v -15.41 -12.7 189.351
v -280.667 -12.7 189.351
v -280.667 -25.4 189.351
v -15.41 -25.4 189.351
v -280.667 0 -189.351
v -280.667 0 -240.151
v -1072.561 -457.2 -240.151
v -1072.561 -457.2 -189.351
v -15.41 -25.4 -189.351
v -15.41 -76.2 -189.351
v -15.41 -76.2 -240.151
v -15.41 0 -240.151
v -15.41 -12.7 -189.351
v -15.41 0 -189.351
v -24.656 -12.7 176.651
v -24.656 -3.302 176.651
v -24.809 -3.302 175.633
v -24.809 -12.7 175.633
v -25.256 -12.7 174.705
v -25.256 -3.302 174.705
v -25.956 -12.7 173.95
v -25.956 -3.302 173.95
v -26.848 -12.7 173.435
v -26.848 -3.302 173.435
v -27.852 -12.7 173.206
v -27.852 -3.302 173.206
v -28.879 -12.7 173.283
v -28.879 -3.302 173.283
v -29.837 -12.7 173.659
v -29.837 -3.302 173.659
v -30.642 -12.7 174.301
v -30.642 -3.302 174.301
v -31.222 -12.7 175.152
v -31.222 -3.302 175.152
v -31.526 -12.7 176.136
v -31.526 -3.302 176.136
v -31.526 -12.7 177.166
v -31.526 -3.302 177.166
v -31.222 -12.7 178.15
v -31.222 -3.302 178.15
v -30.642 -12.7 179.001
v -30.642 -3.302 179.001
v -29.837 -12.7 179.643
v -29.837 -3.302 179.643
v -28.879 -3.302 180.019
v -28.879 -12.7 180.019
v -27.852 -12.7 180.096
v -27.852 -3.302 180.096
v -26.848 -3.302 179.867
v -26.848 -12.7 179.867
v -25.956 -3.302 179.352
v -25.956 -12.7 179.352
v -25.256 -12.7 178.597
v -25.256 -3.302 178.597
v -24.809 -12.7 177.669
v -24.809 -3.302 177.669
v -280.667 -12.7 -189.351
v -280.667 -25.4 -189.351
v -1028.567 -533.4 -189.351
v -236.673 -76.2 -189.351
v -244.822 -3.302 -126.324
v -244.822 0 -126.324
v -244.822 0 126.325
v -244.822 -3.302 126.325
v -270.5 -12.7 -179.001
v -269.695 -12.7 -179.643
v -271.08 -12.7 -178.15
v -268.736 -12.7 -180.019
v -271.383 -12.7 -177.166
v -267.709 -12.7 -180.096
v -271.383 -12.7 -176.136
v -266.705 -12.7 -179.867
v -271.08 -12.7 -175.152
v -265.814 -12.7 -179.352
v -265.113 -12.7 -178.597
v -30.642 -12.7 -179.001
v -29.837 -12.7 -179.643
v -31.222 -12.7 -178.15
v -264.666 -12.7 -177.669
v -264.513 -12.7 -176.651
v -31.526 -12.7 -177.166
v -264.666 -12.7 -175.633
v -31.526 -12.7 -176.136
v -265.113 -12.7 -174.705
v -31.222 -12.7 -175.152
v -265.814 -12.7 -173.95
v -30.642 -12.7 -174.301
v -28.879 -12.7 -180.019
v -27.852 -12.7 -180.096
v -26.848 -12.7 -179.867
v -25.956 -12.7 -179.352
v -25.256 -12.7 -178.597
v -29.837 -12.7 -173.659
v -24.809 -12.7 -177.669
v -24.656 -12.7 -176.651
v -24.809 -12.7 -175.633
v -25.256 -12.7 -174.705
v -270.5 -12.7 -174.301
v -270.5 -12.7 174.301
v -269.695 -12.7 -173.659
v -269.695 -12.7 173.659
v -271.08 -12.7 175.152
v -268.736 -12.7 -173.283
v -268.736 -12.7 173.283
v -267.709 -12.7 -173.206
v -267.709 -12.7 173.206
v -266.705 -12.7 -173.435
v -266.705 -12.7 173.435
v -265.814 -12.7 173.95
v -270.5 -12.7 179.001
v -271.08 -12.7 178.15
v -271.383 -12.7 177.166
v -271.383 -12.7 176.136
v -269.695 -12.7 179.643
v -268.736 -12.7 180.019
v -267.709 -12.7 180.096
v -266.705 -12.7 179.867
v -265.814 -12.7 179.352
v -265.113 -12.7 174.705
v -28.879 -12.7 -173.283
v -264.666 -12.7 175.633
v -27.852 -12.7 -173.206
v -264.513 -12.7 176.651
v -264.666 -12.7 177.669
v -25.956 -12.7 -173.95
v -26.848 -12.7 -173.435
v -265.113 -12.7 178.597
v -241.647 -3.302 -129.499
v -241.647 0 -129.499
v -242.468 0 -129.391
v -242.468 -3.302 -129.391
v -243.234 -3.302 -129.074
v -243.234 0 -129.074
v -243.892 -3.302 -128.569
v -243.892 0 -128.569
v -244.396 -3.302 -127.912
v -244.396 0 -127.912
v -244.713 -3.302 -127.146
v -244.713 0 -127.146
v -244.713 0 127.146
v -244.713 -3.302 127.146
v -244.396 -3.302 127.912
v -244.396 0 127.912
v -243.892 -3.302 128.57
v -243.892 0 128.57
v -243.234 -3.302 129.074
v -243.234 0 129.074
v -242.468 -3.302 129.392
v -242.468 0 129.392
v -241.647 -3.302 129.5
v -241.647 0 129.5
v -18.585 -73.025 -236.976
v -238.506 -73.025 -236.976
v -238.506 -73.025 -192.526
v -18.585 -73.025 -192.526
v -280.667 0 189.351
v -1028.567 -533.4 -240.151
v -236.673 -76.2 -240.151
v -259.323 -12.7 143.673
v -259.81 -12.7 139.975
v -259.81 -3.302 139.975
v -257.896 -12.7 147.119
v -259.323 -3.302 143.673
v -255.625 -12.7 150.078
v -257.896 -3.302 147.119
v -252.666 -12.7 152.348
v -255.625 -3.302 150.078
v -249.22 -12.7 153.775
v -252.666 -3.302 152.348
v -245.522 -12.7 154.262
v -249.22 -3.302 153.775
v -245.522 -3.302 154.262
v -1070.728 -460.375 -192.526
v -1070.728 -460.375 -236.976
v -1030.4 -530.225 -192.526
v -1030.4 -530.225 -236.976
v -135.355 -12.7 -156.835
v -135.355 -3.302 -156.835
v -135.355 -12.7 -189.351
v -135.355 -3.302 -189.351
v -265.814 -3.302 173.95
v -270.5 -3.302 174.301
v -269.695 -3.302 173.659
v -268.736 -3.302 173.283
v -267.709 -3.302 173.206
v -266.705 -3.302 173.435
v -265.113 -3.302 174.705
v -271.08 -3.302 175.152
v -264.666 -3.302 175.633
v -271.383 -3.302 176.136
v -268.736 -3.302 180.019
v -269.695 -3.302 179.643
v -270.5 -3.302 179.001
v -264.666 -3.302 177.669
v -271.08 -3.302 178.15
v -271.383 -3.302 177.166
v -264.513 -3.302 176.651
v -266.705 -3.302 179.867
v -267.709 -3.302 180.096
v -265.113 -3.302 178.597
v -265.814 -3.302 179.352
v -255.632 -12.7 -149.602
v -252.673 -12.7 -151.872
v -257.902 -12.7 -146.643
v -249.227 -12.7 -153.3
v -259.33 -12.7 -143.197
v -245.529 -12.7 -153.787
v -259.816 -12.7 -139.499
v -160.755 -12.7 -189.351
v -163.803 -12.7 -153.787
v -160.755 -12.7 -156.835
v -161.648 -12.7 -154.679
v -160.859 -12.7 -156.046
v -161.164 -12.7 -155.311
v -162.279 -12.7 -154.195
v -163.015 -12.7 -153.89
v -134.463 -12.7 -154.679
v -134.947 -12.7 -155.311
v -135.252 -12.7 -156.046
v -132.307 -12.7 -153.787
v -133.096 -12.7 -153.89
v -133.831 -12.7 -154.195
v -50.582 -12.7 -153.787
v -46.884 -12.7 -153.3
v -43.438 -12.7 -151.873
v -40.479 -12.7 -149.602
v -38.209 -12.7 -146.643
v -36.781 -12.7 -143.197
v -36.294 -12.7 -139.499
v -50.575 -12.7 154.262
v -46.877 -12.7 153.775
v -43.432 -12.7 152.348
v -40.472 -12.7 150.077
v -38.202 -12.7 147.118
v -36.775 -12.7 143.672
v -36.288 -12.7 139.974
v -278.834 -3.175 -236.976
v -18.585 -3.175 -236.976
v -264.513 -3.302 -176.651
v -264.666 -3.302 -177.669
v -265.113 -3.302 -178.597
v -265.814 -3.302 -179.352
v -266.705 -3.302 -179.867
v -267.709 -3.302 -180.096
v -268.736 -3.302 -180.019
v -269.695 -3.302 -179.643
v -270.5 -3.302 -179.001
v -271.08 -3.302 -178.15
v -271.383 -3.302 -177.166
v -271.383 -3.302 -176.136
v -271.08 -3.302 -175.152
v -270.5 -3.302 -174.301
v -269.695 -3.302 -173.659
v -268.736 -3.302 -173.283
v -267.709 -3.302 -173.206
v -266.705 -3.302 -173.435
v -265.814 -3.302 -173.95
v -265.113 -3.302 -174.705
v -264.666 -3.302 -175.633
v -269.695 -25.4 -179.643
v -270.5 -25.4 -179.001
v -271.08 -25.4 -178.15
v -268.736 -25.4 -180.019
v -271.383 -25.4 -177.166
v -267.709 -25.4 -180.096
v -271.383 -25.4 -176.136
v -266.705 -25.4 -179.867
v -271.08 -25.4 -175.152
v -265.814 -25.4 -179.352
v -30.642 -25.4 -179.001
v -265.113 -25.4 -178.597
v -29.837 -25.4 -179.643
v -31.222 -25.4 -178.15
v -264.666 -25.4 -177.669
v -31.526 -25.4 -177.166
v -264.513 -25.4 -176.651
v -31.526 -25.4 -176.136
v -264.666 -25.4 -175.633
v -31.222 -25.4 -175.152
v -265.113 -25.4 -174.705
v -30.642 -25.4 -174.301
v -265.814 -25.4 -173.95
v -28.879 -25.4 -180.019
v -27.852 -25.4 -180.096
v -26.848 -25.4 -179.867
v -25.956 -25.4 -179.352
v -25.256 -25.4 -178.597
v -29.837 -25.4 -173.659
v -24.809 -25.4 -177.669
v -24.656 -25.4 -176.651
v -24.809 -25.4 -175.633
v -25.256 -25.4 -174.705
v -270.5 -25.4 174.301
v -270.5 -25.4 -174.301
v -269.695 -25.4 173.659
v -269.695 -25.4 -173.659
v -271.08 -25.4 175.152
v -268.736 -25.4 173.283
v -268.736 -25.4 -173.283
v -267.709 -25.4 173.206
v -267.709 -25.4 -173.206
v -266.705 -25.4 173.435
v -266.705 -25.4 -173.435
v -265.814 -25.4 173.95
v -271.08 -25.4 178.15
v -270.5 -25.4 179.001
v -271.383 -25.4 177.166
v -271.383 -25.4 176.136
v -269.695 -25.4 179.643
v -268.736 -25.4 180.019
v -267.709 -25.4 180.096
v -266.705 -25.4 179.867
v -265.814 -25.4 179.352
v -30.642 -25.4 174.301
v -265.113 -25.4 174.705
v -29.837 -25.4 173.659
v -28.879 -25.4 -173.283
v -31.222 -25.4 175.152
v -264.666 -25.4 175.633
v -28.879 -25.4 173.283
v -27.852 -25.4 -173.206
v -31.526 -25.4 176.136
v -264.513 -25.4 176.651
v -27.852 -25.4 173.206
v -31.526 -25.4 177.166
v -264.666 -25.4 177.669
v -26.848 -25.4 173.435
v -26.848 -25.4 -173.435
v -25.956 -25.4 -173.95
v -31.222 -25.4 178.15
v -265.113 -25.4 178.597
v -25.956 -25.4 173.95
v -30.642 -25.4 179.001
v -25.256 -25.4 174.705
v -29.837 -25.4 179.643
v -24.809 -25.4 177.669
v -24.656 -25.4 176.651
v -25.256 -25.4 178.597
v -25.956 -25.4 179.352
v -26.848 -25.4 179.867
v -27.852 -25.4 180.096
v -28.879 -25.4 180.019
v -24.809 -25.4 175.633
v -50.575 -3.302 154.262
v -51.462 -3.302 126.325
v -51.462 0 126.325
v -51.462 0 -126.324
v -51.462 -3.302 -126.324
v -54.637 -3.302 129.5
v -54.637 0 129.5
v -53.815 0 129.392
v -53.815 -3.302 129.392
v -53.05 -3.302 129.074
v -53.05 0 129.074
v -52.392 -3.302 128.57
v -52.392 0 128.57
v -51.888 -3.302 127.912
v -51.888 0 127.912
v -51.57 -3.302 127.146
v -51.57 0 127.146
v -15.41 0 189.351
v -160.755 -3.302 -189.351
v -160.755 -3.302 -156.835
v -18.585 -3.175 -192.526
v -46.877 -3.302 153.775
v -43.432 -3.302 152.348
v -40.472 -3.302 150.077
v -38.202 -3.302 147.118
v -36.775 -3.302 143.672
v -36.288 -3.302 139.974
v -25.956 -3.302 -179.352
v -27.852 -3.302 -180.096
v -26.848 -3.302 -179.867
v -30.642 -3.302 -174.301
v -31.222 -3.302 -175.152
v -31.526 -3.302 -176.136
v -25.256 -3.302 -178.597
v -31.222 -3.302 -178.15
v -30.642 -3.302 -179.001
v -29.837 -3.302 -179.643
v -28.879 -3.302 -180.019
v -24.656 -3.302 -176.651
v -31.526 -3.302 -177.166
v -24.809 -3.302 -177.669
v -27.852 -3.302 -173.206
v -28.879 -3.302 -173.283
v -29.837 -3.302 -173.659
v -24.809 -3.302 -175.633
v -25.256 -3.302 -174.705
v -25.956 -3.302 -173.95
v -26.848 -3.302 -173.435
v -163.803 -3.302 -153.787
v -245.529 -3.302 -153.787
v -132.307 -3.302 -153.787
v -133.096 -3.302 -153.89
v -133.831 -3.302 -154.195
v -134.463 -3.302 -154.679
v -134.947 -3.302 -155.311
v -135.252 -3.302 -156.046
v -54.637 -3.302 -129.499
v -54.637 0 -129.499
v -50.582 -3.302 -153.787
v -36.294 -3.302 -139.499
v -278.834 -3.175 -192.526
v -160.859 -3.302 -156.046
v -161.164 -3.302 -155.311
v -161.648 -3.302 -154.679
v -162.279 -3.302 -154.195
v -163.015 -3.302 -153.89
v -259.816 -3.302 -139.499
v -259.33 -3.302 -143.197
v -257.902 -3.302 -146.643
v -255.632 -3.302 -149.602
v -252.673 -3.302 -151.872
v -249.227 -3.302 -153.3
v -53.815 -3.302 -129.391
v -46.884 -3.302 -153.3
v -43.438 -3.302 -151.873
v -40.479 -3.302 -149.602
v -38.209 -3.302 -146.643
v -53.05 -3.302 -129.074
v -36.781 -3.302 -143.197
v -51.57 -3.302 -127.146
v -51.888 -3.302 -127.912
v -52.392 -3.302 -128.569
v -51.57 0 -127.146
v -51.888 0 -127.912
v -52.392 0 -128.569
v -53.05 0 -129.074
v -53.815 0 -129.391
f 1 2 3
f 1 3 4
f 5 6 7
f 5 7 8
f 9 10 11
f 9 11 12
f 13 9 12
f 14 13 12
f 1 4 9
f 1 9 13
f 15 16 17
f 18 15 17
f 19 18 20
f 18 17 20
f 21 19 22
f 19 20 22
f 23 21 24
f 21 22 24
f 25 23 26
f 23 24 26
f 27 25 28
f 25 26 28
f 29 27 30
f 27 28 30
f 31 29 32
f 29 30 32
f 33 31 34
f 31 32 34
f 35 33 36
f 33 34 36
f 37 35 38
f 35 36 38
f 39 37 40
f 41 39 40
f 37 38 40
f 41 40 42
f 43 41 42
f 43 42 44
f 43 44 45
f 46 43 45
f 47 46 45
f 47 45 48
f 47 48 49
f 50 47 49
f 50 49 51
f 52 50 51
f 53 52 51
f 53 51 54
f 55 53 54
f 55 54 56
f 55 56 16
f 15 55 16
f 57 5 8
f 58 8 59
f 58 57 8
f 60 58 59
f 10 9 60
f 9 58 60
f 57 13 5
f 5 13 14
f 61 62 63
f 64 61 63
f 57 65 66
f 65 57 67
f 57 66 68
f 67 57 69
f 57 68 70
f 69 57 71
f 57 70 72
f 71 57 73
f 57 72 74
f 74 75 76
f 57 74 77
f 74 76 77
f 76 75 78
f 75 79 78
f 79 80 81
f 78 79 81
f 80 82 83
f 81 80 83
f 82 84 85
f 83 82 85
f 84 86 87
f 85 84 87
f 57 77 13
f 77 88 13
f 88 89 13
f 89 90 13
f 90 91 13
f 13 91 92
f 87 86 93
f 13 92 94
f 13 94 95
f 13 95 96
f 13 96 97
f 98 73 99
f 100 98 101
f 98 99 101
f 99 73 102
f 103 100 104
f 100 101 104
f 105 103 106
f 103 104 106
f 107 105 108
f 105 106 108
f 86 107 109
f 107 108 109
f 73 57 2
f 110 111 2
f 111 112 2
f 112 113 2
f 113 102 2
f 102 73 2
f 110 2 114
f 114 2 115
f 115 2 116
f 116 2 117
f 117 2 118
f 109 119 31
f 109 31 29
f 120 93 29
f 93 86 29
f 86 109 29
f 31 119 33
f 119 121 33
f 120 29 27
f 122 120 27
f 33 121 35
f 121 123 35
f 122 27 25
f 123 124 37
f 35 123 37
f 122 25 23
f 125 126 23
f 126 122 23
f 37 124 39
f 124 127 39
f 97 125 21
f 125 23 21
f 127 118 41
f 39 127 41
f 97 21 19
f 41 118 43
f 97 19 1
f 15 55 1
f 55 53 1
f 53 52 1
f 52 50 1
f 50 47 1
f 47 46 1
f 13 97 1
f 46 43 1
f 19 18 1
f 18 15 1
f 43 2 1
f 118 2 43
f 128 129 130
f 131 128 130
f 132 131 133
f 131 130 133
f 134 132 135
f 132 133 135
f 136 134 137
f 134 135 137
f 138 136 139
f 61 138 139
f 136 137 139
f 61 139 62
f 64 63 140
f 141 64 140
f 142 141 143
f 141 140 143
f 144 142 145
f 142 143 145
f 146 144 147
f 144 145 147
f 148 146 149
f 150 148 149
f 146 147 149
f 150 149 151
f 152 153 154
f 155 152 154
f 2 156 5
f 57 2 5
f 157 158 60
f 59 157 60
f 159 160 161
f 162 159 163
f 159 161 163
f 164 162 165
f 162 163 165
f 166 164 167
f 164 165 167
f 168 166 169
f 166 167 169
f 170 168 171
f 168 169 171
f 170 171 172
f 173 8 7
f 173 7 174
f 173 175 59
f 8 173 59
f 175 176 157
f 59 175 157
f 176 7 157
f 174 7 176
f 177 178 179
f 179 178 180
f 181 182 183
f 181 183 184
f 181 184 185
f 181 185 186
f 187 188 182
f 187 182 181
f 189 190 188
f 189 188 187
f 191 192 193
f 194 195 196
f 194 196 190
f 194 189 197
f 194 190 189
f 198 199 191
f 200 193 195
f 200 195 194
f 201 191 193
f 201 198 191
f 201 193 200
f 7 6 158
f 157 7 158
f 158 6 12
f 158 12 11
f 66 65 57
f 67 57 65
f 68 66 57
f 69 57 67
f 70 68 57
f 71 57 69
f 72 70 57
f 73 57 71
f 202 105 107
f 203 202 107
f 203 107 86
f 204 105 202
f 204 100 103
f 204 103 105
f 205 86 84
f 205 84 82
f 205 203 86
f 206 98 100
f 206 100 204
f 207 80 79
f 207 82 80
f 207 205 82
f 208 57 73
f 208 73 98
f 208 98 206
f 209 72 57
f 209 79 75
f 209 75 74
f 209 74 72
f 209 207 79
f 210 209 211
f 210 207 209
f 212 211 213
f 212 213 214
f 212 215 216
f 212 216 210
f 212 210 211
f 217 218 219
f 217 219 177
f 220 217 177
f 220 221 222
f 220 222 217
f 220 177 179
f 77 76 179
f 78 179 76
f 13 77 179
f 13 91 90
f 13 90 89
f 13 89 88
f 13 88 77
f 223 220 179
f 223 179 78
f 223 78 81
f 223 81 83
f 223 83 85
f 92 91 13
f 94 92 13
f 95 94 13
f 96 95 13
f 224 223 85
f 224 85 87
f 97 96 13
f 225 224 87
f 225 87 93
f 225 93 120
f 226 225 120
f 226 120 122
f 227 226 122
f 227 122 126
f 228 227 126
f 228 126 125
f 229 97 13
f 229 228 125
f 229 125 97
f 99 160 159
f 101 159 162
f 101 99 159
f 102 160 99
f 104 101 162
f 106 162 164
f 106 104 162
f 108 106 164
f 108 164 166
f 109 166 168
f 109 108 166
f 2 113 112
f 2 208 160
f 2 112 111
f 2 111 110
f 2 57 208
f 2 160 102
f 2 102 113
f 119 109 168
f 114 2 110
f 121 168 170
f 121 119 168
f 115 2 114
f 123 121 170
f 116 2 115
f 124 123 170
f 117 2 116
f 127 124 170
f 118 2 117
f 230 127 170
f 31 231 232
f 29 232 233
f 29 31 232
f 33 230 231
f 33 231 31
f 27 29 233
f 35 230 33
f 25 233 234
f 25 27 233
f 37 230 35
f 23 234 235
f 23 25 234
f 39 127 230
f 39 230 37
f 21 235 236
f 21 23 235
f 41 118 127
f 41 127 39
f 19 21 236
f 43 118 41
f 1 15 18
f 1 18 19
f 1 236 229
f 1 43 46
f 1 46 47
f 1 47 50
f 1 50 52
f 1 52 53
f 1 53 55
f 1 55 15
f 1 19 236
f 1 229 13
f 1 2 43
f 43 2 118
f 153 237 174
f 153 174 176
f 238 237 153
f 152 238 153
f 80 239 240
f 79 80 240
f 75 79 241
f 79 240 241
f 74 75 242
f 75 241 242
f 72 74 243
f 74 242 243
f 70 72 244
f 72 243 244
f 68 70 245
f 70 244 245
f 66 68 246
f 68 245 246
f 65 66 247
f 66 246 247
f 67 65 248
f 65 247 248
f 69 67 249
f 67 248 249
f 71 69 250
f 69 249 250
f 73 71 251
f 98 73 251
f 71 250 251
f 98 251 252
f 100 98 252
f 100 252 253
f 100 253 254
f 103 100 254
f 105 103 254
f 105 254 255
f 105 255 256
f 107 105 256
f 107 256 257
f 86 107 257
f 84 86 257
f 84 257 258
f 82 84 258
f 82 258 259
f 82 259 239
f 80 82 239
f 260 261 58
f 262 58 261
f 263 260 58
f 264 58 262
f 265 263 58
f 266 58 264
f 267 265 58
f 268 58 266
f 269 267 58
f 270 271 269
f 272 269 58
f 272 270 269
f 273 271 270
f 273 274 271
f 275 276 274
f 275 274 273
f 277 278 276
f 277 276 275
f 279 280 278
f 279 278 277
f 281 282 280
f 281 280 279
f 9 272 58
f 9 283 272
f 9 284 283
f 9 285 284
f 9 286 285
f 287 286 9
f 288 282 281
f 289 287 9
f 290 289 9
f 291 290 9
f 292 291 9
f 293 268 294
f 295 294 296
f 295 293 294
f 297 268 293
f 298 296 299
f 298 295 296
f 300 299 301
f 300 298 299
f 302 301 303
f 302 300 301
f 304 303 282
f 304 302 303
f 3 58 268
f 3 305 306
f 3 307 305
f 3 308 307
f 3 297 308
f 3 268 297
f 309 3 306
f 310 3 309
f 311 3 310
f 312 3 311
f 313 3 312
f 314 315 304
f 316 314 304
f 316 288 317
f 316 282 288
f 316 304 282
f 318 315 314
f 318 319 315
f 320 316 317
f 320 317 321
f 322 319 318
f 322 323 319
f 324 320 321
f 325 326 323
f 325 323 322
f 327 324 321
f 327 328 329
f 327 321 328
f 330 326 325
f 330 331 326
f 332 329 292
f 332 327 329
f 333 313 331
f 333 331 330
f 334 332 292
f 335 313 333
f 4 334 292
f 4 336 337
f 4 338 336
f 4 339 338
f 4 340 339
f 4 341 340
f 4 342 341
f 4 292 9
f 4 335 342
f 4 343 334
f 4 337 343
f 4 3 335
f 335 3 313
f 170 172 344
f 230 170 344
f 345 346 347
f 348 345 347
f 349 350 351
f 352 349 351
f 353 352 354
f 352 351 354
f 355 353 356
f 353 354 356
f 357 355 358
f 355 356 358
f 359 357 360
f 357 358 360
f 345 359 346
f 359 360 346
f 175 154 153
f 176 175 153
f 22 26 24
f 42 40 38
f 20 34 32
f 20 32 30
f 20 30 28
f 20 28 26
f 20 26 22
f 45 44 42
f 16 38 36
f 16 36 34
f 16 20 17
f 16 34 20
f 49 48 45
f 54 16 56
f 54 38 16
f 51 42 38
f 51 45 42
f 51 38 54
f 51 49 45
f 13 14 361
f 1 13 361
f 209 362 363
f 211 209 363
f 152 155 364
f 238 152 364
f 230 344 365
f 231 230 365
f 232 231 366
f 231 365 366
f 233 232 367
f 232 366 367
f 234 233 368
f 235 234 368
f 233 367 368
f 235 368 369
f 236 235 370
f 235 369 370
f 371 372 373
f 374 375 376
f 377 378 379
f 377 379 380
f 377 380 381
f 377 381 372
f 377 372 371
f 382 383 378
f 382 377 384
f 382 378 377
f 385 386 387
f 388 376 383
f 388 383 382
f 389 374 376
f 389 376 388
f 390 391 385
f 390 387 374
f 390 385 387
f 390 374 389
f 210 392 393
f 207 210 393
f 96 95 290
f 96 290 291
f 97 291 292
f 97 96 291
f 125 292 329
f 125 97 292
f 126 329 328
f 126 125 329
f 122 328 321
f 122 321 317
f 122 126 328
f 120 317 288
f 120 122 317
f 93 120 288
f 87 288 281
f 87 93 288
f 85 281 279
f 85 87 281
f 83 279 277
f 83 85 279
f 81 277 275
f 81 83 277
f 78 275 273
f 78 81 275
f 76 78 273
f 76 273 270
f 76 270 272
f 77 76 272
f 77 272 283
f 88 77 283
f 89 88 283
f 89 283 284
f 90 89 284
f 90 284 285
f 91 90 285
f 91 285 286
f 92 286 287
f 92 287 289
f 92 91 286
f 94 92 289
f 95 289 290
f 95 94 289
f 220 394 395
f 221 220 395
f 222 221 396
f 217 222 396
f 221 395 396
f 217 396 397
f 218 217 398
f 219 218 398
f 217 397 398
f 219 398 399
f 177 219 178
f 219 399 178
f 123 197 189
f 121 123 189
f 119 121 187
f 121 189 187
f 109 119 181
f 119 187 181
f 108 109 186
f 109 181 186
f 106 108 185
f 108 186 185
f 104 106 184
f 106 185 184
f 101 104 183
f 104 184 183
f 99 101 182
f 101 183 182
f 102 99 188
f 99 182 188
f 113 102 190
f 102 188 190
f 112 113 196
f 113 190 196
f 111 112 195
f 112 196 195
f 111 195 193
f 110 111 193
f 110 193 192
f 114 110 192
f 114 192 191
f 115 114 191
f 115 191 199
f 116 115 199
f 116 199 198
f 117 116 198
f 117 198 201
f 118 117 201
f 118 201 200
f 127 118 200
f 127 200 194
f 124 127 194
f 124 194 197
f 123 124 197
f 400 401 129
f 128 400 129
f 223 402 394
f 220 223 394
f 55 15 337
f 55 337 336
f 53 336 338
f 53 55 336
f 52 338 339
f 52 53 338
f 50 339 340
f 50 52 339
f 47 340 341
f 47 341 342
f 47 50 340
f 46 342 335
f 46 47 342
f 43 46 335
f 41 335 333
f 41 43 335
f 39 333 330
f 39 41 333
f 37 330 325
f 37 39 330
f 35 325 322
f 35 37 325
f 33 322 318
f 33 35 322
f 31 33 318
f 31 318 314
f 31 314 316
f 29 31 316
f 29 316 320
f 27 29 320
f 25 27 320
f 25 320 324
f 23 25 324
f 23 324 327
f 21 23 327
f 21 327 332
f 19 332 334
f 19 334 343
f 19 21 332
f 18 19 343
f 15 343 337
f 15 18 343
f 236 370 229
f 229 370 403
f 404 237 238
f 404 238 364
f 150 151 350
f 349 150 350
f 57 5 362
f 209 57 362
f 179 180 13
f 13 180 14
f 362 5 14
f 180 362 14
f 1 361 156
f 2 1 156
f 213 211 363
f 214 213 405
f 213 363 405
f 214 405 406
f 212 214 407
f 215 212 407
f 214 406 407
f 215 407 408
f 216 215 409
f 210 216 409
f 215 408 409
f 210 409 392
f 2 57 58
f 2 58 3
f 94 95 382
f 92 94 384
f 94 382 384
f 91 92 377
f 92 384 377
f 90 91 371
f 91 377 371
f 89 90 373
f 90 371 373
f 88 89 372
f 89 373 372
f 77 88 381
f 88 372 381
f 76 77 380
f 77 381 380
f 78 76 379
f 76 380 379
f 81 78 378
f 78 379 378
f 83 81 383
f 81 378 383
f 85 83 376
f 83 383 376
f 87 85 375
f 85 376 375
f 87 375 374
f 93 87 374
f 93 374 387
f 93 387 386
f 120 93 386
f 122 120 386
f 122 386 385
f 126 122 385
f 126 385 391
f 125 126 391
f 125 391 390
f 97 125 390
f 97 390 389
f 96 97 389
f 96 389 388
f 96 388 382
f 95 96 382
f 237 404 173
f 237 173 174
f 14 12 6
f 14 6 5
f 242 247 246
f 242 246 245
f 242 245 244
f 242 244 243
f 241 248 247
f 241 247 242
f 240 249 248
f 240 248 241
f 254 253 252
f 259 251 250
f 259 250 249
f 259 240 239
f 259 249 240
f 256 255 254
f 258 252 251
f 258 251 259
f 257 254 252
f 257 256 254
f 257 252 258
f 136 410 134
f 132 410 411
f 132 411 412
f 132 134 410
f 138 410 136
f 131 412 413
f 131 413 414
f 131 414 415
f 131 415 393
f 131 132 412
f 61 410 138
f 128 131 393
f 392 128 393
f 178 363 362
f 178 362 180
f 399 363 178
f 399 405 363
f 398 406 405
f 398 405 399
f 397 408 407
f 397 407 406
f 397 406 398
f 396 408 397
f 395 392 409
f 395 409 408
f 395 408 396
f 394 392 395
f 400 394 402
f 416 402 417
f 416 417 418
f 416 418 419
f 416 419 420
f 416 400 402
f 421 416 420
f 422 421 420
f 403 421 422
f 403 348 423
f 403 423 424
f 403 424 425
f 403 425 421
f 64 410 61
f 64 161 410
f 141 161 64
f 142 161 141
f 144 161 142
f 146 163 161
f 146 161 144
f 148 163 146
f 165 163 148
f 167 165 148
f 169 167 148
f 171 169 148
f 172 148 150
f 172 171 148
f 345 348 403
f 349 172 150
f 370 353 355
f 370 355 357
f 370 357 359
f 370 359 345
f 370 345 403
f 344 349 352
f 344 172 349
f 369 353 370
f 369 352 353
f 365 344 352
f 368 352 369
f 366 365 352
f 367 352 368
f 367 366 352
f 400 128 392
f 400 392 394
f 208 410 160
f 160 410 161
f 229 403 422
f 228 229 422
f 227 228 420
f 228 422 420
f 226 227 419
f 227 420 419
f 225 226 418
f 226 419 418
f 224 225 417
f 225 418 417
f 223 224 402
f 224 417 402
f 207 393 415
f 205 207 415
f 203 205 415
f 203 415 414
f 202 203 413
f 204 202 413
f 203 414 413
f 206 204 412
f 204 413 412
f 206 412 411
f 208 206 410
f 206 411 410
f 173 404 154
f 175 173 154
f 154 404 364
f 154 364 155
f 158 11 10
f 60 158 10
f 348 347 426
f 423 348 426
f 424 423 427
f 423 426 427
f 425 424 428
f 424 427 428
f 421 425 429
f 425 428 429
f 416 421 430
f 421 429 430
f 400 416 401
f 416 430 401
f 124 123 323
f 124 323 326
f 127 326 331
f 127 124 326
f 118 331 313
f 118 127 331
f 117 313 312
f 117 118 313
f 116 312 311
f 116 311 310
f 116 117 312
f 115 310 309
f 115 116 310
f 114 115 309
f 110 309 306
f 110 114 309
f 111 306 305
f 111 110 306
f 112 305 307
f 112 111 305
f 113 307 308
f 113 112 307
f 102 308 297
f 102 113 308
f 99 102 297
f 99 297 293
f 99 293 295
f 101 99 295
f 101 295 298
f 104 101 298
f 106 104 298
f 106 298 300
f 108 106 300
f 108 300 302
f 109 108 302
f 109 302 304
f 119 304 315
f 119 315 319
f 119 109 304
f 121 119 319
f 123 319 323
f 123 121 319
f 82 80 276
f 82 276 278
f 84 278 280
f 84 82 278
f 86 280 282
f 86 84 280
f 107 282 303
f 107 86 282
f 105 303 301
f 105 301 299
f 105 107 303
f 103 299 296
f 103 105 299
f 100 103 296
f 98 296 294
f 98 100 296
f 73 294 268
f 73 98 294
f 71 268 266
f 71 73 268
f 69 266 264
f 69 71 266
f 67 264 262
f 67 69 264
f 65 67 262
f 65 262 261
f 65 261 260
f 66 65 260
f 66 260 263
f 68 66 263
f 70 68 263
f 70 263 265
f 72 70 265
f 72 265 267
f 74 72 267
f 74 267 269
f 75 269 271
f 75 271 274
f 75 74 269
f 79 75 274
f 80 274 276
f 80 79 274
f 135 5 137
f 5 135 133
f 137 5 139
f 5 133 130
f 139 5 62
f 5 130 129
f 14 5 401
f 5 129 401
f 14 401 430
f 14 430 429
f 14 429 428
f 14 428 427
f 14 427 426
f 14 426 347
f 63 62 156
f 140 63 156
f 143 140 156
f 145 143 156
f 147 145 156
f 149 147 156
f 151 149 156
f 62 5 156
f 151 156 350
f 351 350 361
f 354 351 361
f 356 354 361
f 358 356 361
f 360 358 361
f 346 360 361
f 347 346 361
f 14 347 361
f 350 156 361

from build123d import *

# Parameters (mm, degrees)
F0_W      = 265.2573054
F0_H      = 378.7020874
F1_DEPTH  = 12.7
F2_DEPTH  = 3.302
F3_W      = 76.2
F3_H      = 50.8
F3_W_2    = 69.85
F3_H_2    = 44.45
F4_DEPTH  = 265.2573054
F6_DEPTH  = 50.8
F7_DEPTH  = 914.4
F8_W      = 265.2573054
F8_H      = 378.7020874
F8_R      = 3.4544
F9_DEPTH  = 12.7
F11_W     = 76.2
F11_H     = 50.8
F12_DEPTH = 3.175


with BuildPart() as f1:
    # F0 (on Front) → F1 (new body)
    with BuildSketch(Plane.XZ):
        with Locations((148.0387565, -1.27e-05)):
            Rectangle(F0_W, F0_H)
        with BuildLine():
            ThreePointArc((24.6557038, -176.6510564), (28.1101038, -173.1966564), (31.5645038, -176.6510564))
            ThreePointArc((31.5645038, -176.6510564), (28.1101038, -180.1054564), (24.6557038, -176.6510564))
        make_face(mode=Mode.SUBTRACT)
        with BuildLine():
            ThreePointArc((264.5130092, -176.6510564), (267.9674092, -173.1966564), (271.4218092, -176.6510564))
            ThreePointArc((271.4218092, -176.6510564), (267.9674092, -180.1054564), (264.5130092, -176.6510564))
        make_face(mode=Mode.SUBTRACT)
        with BuildLine():
            ThreePointArc((24.6557038, 176.651031), (28.1101038, 180.105431), (31.5645038, 176.651031))
            ThreePointArc((31.5645038, 176.651031), (28.1101038, 173.196631), (24.6557038, 176.651031))
        make_face(mode=Mode.SUBTRACT)
        with BuildLine():
            ThreePointArc((264.5130092, 176.651031), (267.9674092, 180.105431), (271.4218092, 176.651031))
            ThreePointArc((271.4218092, 176.651031), (267.9674092, 173.196631), (264.5130092, 176.651031))
        make_face(mode=Mode.SUBTRACT)
    extrude(amount=F1_DEPTH)


with BuildPart() as f1b:
    # F0 (on Front) → F1, piece 2 (new body)
    with BuildSketch(Plane.XZ):
        with BuildLine():
            Line((-259.816473, -139.4988066), (-259.809869, 139.9750058))
            ThreePointArc((-259.8098689962, 139.9750058), (-255.6250403922, 150.0775804789), (-245.522369, 154.2621756))
            Line((-245.522369, 154.2621756), (-50.5753624, 154.2621756))
            ThreePointArc((-50.5753624, 154.2621756), (-40.4724665013, 150.0773559726), (-36.2878624033, 139.9743708))
            Line((-36.2878624, 139.9743708), (-36.2944664, -139.4994416))
            ThreePointArc((-36.2944664038, -139.4994416), (-40.4792950078, -149.6020162789), (-50.5819664, -153.7866114))
            Line((-50.5819664, -153.7866114), (-132.307457, -153.7866114))
            ThreePointArc((-132.307457, -153.7866114), (-134.4627184691, -154.6793499309), (-135.355457, -156.8346114))
            Line((-135.355457, -156.8346114), (-135.355457, -171.7670174))
            Line((-135.355457, -171.7670174), (-135.355457, -187.919233))
            Line((-135.355457, -187.919233), (-135.355457, -189.3510564))
            Line((-135.355457, -189.3510564), (-15.4101038, -189.3510564))
            Line((-15.4101038, -189.3510564), (-15.4101038, 189.351031))
            Line((-15.4101038, 189.351031), (-280.6674092, 189.351031))
            Line((-280.6674092, 189.351031), (-280.6674092, -189.3510564))
            Line((-280.6674092, -189.3510564), (-160.755457, -189.3510564))
            Line((-160.755457, -189.3510564), (-160.755457, -187.919233))
            Line((-160.755457, -187.919233), (-160.755457, -171.7670174))
            Line((-160.755457, -171.7670174), (-160.755457, -156.8346114))
            ThreePointArc((-160.755457, -156.8346114), (-161.6481955309, -154.6793499309), (-163.803457, -153.7866114))
            Line((-163.803457, -153.7866114), (-245.528973, -153.7866114))
            ThreePointArc((-245.528973, -153.7866114), (-255.6318688987, -149.6017917726), (-259.8164729967, -139.4988066))
        make_face()
        with BuildLine():
            ThreePointArc((-271.4218092, -176.6510564), (-267.9674092, -173.1966564), (-264.5130092, -176.6510564))
            ThreePointArc((-264.5130092, -176.6510564), (-267.9674092, -180.1054564), (-271.4218092, -176.6510564))
        make_face(mode=Mode.SUBTRACT)
        with BuildLine():
            ThreePointArc((-31.5645038, -176.6510564), (-28.1101038, -173.1966564), (-24.6557038, -176.6510564))
            ThreePointArc((-24.6557038, -176.6510564), (-28.1101038, -180.1054564), (-31.5645038, -176.6510564))
        make_face(mode=Mode.SUBTRACT)
        with BuildLine():
            ThreePointArc((-271.4218092, 176.651031), (-267.9674092, 180.105431), (-264.5130092, 176.651031))
            ThreePointArc((-264.5130092, 176.651031), (-267.9674092, 173.196631), (-271.4218092, 176.651031))
        make_face(mode=Mode.SUBTRACT)
        with BuildLine():
            ThreePointArc((-31.5645038, 176.651031), (-28.1101038, 180.105431), (-24.6557038, 176.651031))
            ThreePointArc((-24.6557038, 176.651031), (-28.1101038, 173.196631), (-31.5645038, 176.651031))
        make_face(mode=Mode.SUBTRACT)
    extrude(amount=F1_DEPTH)

    # F0 (on Front) → F2 (join)
    with BuildSketch(Plane.XZ):
        with BuildLine():
            ThreePointArc((-245.522369, 154.2621756), (-255.6250403922, 150.0775804789), (-259.8098689962, 139.9750058))
            Line((-259.809869, 139.9750058), (-259.816473, -139.4988066))
            ThreePointArc((-259.8164729967, -139.4988066), (-255.6318688987, -149.6017917726), (-245.528973, -153.7866114))
            Line((-245.528973, -153.7866114), (-163.803457, -153.7866114))
            ThreePointArc((-163.803457, -153.7866114), (-161.6481955309, -154.6793499309), (-160.755457, -156.8346114))
            Line((-160.755457, -156.8346114), (-160.755457, -171.7670174))
            Line((-160.755457, -171.7670174), (-160.755457, -187.919233))
            Line((-160.755457, -187.919233), (-160.755457, -189.3510564))
            Line((-160.755457, -189.3510564), (-135.355457, -189.3510564))
            Line((-135.355457, -189.3510564), (-135.355457, -187.919233))
            Line((-135.355457, -187.919233), (-135.355457, -171.7670174))
            Line((-135.355457, -171.7670174), (-135.355457, -156.8346114))
            ThreePointArc((-135.355457, -156.8346114), (-134.4627184691, -154.6793499309), (-132.307457, -153.7866114))
            Line((-132.307457, -153.7866114), (-50.5819664, -153.7866114))
            ThreePointArc((-50.5819664, -153.7866114), (-40.4792950078, -149.6020162789), (-36.2944664038, -139.4994416))
            Line((-36.2944664, -139.4994416), (-36.2878624, 139.9743708))
            ThreePointArc((-36.2878624033, 139.9743708), (-40.4724665013, 150.0773559726), (-50.5753624, 154.2621756))
            Line((-50.5753624, 154.2621756), (-245.522369, 154.2621756))
        make_face()
        with BuildLine():
            ThreePointArc((-241.6466592, -129.499233), (-243.8917232303, -128.5692970303), (-244.8216592, -126.324233))
            Line((-244.8216592, -126.324233), (-244.8216592, 126.324741))
            ThreePointArc((-244.8216592, 126.324741), (-243.8917232303, 128.5698050303), (-241.6466592, 129.499741))
            Line((-241.6466592, 129.499741), (-54.6371526, 129.499741))
            ThreePointArc((-54.6371526, 129.499741), (-52.3920885697, 128.5698050303), (-51.4621526, 126.324741))
            Line((-51.4621526, 126.324741), (-51.4621526, -126.324233))
            ThreePointArc((-51.4621526, -126.324233), (-52.3920885697, -128.5692970303), (-54.6371526, -129.499233))
            Line((-54.6371526, -129.499233), (-241.6466592, -129.499233))
        make_face(mode=Mode.SUBTRACT)
        with BuildLine():
            ThreePointArc((-31.5645038, 176.651031), (-28.1101038, 173.196631), (-24.6557038, 176.651031))
            ThreePointArc((-24.6557038, 176.651031), (-28.1101038, 180.105431), (-31.5645038, 176.651031))
        make_face()
        with BuildLine():
            ThreePointArc((-31.5645038, -176.6510564), (-28.1101038, -180.1054564), (-24.6557038, -176.6510564))
            ThreePointArc((-24.6557038, -176.6510564), (-28.1101038, -173.1966564), (-31.5645038, -176.6510564))
        make_face()
        with BuildLine():
            ThreePointArc((-271.4218092, -176.6510564), (-267.9674092, -180.1054564), (-264.5130092, -176.6510564))
            ThreePointArc((-264.5130092, -176.6510564), (-267.9674092, -173.1966564), (-271.4218092, -176.6510564))
        make_face()
        with BuildLine():
            ThreePointArc((-271.4218092, 176.651031), (-267.9674092, 173.196631), (-264.5130092, 176.651031))
            ThreePointArc((-264.5130092, 176.651031), (-267.9674092, 180.105431), (-271.4218092, 176.651031))
        make_face()
    extrude(amount=F2_DEPTH)


with BuildPart() as f4:
    # F3 (on face) → F4 (new body, through all)
    with BuildSketch(Plane.YZ.offset(-15.4101038)):
        with Locations((-38.1, -214.7510564)):
            Rectangle(F3_W, F3_H)
        with Locations((-38.1, -214.7510564)):
            Rectangle(F3_W_2, F3_H_2, mode=Mode.SUBTRACT)
    extrude(amount=-F4_DEPTH)

    # F5 (on face) → F6 (cut)
    with BuildSketch(Plane(origin=(0, 0, -240.1510564), x_dir=(1, 0, 0), z_dir=(0, 0, -1))):
        Polygon((-280.6674092001, 76.2), (-280.6674092001, 0), (-236.6733186879, 76.2), align=None)
    extrude(amount=-F6_DEPTH, mode=Mode.SUBTRACT)

    # F7 (add): a face of the model
    f7_faces = [f4.faces().sort_by_distance(p)[0] for p in [
        (-258.670363944, -38.1, -239.1350564),
    ]]
    extrude(f7_faces, amount=F7_DEPTH)

    # F8 (on face) → F9 (join)
    with BuildSketch(Plane.XZ.offset(12.7)):
        with Locations((-148.0387565, -1.27e-05)):
            Rectangle(F8_W, F8_H)
        with Locations((-267.9674092, -176.6510564)):
            Circle(F8_R, mode=Mode.SUBTRACT)
        with Locations((-28.1101038, -176.6510564)):
            Circle(F8_R, mode=Mode.SUBTRACT)
        with Locations((-267.9674092, 176.651031)):
            Circle(F8_R, mode=Mode.SUBTRACT)
        with Locations((-28.1101038, 176.651031)):
            Circle(F8_R, mode=Mode.SUBTRACT)
    extrude(amount=F9_DEPTH)

    # F10: union 

    # F11 (on face) → F12 (join)
    with BuildSketch(Plane.YZ.offset(-15.4101038)):
        with Locations((-38.1, -214.7510564)):
            Rectangle(F11_W, F11_H)
    extrude(amount=-F12_DEPTH)


solid = Compound([f1b.part, f4.part])
